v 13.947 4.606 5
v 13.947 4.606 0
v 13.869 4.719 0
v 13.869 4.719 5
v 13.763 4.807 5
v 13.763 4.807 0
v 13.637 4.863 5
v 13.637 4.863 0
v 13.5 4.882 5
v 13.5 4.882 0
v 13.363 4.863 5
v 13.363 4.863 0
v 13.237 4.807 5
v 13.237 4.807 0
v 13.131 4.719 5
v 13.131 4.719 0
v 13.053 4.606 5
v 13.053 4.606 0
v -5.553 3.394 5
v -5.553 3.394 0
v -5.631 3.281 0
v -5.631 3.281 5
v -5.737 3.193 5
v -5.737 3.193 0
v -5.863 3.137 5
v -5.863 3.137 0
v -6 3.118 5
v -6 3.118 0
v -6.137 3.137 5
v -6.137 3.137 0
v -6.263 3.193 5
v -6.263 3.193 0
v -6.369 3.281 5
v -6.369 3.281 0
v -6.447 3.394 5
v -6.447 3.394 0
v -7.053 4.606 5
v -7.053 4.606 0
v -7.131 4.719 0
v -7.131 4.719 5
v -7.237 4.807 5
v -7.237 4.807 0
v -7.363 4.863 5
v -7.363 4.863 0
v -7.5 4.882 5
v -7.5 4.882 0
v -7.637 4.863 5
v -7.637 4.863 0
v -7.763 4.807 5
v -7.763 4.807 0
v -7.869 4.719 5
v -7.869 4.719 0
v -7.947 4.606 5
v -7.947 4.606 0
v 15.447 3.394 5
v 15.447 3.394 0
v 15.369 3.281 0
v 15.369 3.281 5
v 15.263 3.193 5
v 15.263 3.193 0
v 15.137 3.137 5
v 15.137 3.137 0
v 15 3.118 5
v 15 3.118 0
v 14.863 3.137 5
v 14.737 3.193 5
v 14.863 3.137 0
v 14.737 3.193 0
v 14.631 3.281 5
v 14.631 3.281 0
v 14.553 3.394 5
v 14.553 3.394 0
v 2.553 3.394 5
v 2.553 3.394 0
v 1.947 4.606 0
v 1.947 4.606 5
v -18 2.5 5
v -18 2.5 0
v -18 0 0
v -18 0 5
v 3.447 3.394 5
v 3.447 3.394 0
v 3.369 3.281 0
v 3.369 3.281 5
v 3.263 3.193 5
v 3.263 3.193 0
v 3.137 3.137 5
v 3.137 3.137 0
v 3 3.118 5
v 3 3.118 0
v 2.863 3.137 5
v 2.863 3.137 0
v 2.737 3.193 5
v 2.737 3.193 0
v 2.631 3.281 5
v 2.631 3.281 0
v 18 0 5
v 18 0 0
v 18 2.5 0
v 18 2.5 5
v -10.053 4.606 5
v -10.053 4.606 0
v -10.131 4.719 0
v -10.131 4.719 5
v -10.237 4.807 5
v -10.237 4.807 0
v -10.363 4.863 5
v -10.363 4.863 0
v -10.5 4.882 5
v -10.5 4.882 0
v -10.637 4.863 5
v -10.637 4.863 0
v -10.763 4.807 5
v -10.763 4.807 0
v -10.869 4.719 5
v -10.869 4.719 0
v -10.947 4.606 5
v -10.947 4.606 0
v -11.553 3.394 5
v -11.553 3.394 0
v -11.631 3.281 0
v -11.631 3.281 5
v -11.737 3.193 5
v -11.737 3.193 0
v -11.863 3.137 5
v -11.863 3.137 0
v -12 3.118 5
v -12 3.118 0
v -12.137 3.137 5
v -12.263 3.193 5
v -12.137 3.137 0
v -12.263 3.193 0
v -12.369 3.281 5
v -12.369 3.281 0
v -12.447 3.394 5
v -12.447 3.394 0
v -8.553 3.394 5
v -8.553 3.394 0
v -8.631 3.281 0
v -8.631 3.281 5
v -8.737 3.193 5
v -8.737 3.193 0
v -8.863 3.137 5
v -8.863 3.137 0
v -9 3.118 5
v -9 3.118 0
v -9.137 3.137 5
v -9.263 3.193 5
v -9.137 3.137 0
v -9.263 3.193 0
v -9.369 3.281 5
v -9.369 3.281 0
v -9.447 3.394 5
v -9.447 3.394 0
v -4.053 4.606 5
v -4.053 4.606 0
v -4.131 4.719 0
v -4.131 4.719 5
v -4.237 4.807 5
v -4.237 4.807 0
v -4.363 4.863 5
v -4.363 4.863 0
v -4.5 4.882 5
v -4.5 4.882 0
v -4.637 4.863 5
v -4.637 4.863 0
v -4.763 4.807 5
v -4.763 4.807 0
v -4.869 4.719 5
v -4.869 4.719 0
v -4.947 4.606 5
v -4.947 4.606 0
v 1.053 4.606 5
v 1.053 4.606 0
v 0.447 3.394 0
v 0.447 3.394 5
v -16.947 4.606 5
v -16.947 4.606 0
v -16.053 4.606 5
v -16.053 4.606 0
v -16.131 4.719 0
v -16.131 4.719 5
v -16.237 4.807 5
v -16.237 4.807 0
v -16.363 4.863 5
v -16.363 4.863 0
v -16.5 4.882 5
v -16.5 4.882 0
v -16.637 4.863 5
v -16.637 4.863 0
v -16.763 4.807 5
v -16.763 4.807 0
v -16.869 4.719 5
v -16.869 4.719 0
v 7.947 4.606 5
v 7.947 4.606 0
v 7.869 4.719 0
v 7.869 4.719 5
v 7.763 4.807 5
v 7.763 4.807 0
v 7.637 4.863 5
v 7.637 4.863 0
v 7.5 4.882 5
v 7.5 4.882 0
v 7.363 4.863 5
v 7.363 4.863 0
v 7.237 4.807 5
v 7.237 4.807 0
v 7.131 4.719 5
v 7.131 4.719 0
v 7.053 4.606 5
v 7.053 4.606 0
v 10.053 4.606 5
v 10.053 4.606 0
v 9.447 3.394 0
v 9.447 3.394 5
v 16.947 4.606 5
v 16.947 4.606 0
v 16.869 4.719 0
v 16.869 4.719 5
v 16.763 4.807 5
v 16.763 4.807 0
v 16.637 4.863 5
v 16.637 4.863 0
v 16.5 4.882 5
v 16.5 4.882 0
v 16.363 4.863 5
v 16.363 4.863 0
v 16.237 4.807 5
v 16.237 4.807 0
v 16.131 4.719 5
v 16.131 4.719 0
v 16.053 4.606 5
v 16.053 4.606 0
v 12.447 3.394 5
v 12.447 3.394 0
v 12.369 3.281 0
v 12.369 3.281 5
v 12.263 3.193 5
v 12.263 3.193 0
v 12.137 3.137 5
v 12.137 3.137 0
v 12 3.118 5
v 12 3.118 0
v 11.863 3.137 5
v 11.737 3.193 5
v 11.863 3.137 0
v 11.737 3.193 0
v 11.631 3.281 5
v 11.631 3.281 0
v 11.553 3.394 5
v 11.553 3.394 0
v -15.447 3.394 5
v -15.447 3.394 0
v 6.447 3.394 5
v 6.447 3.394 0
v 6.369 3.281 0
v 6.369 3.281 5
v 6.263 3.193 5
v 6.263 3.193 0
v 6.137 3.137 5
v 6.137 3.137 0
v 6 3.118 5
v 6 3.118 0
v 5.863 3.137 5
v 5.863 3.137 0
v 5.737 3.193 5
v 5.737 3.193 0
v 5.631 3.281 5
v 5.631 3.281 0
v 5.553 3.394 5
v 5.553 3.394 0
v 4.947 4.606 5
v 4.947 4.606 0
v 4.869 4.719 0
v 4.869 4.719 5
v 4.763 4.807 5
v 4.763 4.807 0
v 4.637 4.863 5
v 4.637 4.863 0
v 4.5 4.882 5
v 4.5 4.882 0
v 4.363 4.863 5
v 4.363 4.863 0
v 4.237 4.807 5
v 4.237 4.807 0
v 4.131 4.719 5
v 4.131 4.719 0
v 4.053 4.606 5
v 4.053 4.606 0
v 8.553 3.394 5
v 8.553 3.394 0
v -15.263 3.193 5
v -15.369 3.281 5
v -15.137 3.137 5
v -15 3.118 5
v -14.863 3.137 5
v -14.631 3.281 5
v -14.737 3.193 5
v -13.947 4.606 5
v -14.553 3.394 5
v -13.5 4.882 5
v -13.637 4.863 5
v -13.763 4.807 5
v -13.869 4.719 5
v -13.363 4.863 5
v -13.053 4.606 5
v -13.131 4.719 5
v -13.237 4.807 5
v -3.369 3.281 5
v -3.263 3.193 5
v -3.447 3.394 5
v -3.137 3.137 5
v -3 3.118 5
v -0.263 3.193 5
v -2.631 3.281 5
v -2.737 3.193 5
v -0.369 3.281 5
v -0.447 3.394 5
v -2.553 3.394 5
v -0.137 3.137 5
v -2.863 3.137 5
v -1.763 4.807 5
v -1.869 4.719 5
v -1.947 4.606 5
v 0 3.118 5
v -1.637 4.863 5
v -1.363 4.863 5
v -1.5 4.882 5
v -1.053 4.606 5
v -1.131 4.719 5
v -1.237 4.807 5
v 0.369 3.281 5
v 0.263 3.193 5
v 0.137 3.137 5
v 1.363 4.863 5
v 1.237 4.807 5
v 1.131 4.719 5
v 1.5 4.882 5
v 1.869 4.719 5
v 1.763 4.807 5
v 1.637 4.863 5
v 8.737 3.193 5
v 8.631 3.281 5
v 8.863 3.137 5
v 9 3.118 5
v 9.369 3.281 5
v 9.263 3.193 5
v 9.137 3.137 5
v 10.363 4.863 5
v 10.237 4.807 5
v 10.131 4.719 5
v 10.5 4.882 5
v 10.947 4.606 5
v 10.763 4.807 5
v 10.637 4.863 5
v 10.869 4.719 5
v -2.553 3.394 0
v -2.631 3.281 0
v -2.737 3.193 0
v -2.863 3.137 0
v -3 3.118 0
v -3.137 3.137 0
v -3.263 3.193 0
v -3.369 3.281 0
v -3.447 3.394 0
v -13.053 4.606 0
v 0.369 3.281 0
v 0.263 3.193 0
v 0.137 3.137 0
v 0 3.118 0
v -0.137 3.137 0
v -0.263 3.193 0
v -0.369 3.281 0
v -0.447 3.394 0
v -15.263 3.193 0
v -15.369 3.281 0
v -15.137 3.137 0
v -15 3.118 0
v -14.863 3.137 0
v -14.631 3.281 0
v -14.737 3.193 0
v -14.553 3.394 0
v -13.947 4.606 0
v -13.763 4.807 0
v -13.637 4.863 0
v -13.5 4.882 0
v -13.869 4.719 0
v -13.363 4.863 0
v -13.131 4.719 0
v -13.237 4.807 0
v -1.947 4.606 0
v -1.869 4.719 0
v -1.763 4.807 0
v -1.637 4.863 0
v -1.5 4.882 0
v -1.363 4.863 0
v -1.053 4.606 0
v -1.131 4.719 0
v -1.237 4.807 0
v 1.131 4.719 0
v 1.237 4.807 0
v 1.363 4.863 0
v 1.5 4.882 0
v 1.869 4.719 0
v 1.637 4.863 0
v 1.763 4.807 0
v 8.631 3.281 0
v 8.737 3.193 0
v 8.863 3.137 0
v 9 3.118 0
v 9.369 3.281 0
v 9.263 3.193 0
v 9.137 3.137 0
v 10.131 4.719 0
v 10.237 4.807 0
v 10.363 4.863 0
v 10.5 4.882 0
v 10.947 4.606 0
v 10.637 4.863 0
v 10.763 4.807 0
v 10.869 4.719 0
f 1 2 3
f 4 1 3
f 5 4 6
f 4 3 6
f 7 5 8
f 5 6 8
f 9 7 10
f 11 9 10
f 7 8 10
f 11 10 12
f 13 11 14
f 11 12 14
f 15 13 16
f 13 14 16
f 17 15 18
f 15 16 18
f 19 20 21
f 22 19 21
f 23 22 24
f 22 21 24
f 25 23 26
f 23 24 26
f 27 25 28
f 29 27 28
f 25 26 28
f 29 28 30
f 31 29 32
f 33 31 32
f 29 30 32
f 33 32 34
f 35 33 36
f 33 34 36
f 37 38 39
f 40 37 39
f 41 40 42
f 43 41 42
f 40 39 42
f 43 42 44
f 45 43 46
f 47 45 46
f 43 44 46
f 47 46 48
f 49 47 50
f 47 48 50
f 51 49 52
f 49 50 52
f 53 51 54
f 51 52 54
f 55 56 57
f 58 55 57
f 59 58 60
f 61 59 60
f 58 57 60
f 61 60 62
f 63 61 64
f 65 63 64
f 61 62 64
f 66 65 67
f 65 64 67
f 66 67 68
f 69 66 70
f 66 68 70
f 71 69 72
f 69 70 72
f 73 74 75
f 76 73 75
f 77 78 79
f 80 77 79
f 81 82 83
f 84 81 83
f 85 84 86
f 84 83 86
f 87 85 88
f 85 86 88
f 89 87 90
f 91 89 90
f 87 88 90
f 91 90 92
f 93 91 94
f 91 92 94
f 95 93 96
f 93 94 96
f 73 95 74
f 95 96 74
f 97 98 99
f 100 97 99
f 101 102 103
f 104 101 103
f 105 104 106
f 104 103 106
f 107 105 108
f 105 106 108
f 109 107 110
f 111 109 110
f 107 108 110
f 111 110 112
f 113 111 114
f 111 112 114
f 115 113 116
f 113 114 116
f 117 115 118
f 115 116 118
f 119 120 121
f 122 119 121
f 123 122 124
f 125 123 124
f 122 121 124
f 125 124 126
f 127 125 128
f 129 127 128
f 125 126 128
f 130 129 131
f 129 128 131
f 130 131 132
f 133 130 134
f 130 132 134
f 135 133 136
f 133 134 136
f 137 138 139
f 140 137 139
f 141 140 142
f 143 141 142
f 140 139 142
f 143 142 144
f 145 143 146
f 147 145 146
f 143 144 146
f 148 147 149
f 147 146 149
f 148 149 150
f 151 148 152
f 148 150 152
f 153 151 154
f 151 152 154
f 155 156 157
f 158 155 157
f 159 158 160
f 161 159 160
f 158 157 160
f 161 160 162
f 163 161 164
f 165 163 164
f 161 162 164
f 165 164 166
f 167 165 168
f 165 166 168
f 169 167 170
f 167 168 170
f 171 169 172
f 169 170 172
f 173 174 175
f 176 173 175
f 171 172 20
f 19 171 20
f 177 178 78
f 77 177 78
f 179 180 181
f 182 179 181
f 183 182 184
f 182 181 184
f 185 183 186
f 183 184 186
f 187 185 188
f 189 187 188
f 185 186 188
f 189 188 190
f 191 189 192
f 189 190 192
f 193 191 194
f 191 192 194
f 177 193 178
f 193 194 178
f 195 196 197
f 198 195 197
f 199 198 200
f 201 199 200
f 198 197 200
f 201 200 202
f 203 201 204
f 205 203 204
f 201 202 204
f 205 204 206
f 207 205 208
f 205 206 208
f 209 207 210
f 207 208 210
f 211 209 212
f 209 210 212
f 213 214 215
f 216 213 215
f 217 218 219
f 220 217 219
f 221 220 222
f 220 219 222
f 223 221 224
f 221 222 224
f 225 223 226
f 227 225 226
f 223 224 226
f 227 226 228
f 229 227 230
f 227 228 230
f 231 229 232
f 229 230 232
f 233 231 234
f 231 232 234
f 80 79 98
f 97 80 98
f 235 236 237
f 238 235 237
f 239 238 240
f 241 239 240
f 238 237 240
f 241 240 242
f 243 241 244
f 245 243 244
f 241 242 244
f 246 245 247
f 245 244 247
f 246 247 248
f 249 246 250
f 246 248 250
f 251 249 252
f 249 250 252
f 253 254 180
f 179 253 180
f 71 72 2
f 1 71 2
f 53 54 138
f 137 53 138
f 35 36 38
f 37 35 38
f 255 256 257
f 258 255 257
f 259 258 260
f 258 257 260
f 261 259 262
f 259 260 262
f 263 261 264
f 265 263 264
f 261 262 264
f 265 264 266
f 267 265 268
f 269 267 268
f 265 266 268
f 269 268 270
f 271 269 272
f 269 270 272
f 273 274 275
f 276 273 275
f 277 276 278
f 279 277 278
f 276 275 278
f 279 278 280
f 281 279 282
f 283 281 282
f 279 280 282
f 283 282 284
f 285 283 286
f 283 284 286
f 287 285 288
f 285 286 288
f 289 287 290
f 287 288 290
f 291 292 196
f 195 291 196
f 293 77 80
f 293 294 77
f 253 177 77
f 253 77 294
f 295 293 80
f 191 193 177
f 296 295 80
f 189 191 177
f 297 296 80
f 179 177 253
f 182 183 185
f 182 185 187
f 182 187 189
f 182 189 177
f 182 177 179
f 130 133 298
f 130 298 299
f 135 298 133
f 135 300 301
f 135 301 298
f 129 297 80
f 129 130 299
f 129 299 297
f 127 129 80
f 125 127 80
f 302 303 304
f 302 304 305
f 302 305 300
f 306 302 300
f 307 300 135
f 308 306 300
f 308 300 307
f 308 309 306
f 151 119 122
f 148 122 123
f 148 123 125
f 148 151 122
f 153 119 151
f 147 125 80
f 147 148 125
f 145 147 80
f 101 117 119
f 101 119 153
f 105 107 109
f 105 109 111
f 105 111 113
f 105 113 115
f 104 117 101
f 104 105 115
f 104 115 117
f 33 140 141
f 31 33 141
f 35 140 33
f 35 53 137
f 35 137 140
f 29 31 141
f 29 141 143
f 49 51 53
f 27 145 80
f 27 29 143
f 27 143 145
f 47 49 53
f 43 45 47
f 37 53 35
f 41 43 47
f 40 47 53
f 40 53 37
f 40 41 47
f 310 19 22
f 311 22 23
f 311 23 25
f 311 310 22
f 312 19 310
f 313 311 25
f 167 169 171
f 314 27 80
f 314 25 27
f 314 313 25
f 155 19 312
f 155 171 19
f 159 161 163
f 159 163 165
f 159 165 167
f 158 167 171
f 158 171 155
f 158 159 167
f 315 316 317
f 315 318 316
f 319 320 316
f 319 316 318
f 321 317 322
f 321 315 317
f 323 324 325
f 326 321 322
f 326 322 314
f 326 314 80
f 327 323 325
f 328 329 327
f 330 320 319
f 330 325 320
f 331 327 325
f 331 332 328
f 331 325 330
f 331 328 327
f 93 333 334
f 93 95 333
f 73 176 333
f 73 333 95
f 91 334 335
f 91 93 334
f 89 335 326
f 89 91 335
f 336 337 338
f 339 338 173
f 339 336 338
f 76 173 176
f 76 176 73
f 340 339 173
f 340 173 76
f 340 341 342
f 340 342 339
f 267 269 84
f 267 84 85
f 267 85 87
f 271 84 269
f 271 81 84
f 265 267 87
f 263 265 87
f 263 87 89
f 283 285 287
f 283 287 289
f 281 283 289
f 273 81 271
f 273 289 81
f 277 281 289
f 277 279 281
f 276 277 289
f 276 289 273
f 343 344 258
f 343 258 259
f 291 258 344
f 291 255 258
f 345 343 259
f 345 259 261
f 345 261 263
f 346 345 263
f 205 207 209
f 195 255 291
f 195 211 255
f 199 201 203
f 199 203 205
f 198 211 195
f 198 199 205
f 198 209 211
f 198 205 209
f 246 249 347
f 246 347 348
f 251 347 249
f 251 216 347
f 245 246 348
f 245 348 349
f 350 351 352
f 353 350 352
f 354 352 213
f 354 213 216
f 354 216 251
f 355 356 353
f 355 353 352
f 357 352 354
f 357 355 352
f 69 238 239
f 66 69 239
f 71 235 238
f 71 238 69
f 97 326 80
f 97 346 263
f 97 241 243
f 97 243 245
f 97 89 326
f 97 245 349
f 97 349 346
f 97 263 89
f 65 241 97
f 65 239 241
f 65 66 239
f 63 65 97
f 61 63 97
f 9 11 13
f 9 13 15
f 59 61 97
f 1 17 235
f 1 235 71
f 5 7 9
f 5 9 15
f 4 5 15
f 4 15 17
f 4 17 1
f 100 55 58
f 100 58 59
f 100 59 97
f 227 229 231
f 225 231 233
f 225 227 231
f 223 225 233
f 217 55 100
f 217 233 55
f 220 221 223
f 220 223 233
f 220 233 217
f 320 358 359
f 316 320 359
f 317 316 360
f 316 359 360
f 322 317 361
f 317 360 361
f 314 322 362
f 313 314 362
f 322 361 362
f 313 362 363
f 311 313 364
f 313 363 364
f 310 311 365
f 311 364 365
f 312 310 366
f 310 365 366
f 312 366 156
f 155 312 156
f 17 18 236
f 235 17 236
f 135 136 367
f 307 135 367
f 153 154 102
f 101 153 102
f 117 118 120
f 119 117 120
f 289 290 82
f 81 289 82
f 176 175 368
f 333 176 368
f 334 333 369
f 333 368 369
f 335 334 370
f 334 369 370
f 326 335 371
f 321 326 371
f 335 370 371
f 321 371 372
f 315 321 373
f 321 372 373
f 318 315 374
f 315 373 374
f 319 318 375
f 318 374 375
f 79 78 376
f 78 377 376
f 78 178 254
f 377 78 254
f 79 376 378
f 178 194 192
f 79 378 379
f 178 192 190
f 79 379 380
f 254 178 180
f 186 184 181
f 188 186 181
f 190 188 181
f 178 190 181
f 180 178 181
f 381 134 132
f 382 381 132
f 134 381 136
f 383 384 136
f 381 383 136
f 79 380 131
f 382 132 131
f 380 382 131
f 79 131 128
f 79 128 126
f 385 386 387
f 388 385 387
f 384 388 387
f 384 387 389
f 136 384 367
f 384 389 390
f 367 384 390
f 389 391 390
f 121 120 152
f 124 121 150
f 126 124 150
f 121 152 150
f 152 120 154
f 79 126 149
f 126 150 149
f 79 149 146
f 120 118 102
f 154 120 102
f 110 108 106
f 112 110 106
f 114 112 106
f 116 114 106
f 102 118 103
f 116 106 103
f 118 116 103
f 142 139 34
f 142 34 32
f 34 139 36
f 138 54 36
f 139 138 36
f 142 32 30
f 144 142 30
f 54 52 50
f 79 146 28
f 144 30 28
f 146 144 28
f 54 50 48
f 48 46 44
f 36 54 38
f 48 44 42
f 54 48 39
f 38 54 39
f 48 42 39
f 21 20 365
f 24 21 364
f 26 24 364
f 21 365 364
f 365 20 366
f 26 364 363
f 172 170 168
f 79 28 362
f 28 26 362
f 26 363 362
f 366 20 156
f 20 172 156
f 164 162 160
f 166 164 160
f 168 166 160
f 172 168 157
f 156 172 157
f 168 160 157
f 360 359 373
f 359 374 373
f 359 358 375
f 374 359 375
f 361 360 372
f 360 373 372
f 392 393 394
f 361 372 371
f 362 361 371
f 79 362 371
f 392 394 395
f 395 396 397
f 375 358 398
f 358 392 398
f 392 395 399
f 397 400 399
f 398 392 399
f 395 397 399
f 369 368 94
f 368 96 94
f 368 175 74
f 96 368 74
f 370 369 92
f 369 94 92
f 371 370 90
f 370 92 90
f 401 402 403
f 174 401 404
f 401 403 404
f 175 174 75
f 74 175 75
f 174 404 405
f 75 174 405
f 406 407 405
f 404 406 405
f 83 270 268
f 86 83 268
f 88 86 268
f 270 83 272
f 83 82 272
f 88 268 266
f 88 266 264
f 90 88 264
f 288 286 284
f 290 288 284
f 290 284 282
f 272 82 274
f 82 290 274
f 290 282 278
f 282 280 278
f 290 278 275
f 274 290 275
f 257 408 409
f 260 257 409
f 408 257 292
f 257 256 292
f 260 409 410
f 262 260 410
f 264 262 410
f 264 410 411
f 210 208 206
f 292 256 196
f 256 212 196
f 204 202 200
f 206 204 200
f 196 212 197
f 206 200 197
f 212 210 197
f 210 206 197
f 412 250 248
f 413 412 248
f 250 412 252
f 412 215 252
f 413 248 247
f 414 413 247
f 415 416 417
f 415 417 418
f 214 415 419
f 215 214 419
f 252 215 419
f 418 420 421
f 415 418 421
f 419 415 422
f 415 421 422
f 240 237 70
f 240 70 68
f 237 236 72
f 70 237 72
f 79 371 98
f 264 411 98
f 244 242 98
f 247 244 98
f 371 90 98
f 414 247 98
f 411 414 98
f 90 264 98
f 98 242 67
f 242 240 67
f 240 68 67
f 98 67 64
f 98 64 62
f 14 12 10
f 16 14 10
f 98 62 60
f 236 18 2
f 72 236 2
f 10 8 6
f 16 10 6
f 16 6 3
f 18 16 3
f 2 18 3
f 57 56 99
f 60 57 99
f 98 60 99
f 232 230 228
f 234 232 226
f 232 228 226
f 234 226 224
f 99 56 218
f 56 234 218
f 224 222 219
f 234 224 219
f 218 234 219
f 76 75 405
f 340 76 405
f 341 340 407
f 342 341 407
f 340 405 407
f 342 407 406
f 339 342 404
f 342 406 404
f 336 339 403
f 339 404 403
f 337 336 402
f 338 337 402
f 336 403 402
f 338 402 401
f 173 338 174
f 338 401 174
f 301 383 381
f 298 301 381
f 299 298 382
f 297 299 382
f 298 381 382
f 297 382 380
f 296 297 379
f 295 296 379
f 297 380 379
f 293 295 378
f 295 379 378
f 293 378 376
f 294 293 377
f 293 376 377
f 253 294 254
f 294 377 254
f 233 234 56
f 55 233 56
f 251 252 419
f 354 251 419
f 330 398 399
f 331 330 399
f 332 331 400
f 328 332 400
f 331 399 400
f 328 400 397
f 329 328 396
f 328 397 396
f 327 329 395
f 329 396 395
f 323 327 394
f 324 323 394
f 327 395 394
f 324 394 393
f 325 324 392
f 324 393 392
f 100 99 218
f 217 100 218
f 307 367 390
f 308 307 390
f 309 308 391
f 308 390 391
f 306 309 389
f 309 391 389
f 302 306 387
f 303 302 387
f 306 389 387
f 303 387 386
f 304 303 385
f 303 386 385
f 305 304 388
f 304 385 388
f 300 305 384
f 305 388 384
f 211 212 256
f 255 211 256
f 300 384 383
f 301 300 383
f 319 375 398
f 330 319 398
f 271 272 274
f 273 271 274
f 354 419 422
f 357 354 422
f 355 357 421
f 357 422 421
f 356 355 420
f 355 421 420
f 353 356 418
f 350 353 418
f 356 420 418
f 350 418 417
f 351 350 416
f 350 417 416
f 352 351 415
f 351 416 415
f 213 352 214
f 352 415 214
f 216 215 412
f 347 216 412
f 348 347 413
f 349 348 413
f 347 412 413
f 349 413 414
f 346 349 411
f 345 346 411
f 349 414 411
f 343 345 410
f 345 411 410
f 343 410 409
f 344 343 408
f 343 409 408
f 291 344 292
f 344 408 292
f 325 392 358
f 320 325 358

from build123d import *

# Parameters (mm, degrees)
BOSS_EXTRUDE1_DEPTH = 5


with BuildPart() as part:
    # Sketch2 → Boss-Extrude1 (new body)
    with BuildSketch(Plane.XY):
        with BuildLine():
            Line((-18, 0), (18, 0))
            Line((18, 0), (18, 2.5))
            Line((18, 2.5), (16.947213595, 4.605572809))
            ThreePointArc((16.947213595, 4.605572809), (16.5, 4.881966011), (16.052786405, 4.605572809))
            Line((16.052786405, 4.605572809), (15.447213595, 3.394427191))
            ThreePointArc((15.447213595, 3.394427191), (15, 3.118033989), (14.552786405, 3.394427191))
            Line((14.552786405, 3.394427191), (13.947213595, 4.605572809))
            ThreePointArc((13.947213595, 4.605572809), (13.5, 4.881966011), (13.052786405, 4.605572809))
            Line((13.052786405, 4.605572809), (12.447213595, 3.394427191))
            ThreePointArc((12.447213595, 3.394427191), (12, 3.118033989), (11.552786405, 3.394427191))
            Line((11.552786405, 3.394427191), (10.947213595, 4.605572809))
            ThreePointArc((10.947213595, 4.605572809), (10.5, 4.881966011), (10.052786405, 4.605572809))
            Line((10.052786405, 4.605572809), (9.447213595, 3.394427191))
            ThreePointArc((9.447213595, 3.394427191), (9, 3.118033989), (8.552786405, 3.394427191))
            Line((8.552786405, 3.394427191), (7.947213595, 4.605572809))
            ThreePointArc((7.947213595, 4.605572809), (7.5, 4.881966011), (7.052786405, 4.605572809))
            Line((7.052786405, 4.605572809), (6.447213595, 3.394427191))
            ThreePointArc((6.447213595, 3.394427191), (6, 3.118033989), (5.552786405, 3.394427191))
            Line((5.552786405, 3.394427191), (4.947213595, 4.605572809))
            ThreePointArc((4.947213595, 4.605572809), (4.5, 4.881966011), (4.052786405, 4.605572809))
            Line((4.052786405, 4.605572809), (3.447213595, 3.394427191))
            ThreePointArc((3.447213595, 3.394427191), (3, 3.118033989), (2.552786405, 3.394427191))
            Line((2.552786405, 3.394427191), (1.947213595, 4.605572809))
            ThreePointArc((1.947213595, 4.605572809), (1.5, 4.881966011), (1.052786405, 4.605572809))
            Line((1.052786405, 4.605572809), (0.447213595, 3.394427191))
            ThreePointArc((0.447213595, 3.394427191), (0, 3.118033989), (-0.447213595, 3.394427191))
            Line((-0.447213595, 3.394427191), (-1.052786405, 4.605572809))
            ThreePointArc((-1.052786405, 4.605572809), (-1.5, 4.881966011), (-1.947213595, 4.605572809))
            Line((-1.947213595, 4.605572809), (-2.552786405, 3.394427191))
            ThreePointArc((-2.552786405, 3.394427191), (-3, 3.118033989), (-3.447213595, 3.394427191))
            Line((-3.447213595, 3.394427191), (-4.052786405, 4.605572809))
            ThreePointArc((-4.052786405, 4.605572809), (-4.5, 4.881966011), (-4.947213595, 4.605572809))
            Line((-4.947213595, 4.605572809), (-5.552786405, 3.394427191))
            ThreePointArc((-5.552786405, 3.394427191), (-6, 3.118033989), (-6.447213595, 3.394427191))
            Line((-6.447213595, 3.394427191), (-7.052786405, 4.605572809))
            ThreePointArc((-7.052786405, 4.605572809), (-7.5, 4.881966011), (-7.947213595, 4.605572809))
            Line((-7.947213595, 4.605572809), (-8.552786405, 3.394427191))
            ThreePointArc((-8.552786405, 3.394427191), (-9, 3.118033989), (-9.447213595, 3.394427191))
            Line((-9.447213595, 3.394427191), (-10.052786405, 4.605572809))
            ThreePointArc((-10.052786405, 4.605572809), (-10.5, 4.881966011), (-10.947213595, 4.605572809))
            Line((-10.947213595, 4.605572809), (-11.552786405, 3.394427191))
            ThreePointArc((-11.552786405, 3.394427191), (-12, 3.118033989), (-12.447213595, 3.394427191))
            Line((-12.447213595, 3.394427191), (-13.052786405, 4.605572809))
            ThreePointArc((-13.052786405, 4.605572809), (-13.5, 4.881966011), (-13.947213595, 4.605572809))
            Line((-13.947213595, 4.605572809), (-14.552786405, 3.394427191))
            ThreePointArc((-14.552786405, 3.394427191), (-15, 3.118033989), (-15.447213595, 3.394427191))
            Line((-15.447213595, 3.394427191), (-16.052786405, 4.605572809))
            ThreePointArc((-16.052786405, 4.605572809), (-16.5, 4.881966011), (-16.947213595, 4.605572809))
            Line((-16.947213595, 4.605572809), (-18, 2.5))
            Line((-18, 2.5), (-18, 0))
        make_face()
    extrude(amount=BOSS_EXTRUDE1_DEPTH)


solid = part.part
